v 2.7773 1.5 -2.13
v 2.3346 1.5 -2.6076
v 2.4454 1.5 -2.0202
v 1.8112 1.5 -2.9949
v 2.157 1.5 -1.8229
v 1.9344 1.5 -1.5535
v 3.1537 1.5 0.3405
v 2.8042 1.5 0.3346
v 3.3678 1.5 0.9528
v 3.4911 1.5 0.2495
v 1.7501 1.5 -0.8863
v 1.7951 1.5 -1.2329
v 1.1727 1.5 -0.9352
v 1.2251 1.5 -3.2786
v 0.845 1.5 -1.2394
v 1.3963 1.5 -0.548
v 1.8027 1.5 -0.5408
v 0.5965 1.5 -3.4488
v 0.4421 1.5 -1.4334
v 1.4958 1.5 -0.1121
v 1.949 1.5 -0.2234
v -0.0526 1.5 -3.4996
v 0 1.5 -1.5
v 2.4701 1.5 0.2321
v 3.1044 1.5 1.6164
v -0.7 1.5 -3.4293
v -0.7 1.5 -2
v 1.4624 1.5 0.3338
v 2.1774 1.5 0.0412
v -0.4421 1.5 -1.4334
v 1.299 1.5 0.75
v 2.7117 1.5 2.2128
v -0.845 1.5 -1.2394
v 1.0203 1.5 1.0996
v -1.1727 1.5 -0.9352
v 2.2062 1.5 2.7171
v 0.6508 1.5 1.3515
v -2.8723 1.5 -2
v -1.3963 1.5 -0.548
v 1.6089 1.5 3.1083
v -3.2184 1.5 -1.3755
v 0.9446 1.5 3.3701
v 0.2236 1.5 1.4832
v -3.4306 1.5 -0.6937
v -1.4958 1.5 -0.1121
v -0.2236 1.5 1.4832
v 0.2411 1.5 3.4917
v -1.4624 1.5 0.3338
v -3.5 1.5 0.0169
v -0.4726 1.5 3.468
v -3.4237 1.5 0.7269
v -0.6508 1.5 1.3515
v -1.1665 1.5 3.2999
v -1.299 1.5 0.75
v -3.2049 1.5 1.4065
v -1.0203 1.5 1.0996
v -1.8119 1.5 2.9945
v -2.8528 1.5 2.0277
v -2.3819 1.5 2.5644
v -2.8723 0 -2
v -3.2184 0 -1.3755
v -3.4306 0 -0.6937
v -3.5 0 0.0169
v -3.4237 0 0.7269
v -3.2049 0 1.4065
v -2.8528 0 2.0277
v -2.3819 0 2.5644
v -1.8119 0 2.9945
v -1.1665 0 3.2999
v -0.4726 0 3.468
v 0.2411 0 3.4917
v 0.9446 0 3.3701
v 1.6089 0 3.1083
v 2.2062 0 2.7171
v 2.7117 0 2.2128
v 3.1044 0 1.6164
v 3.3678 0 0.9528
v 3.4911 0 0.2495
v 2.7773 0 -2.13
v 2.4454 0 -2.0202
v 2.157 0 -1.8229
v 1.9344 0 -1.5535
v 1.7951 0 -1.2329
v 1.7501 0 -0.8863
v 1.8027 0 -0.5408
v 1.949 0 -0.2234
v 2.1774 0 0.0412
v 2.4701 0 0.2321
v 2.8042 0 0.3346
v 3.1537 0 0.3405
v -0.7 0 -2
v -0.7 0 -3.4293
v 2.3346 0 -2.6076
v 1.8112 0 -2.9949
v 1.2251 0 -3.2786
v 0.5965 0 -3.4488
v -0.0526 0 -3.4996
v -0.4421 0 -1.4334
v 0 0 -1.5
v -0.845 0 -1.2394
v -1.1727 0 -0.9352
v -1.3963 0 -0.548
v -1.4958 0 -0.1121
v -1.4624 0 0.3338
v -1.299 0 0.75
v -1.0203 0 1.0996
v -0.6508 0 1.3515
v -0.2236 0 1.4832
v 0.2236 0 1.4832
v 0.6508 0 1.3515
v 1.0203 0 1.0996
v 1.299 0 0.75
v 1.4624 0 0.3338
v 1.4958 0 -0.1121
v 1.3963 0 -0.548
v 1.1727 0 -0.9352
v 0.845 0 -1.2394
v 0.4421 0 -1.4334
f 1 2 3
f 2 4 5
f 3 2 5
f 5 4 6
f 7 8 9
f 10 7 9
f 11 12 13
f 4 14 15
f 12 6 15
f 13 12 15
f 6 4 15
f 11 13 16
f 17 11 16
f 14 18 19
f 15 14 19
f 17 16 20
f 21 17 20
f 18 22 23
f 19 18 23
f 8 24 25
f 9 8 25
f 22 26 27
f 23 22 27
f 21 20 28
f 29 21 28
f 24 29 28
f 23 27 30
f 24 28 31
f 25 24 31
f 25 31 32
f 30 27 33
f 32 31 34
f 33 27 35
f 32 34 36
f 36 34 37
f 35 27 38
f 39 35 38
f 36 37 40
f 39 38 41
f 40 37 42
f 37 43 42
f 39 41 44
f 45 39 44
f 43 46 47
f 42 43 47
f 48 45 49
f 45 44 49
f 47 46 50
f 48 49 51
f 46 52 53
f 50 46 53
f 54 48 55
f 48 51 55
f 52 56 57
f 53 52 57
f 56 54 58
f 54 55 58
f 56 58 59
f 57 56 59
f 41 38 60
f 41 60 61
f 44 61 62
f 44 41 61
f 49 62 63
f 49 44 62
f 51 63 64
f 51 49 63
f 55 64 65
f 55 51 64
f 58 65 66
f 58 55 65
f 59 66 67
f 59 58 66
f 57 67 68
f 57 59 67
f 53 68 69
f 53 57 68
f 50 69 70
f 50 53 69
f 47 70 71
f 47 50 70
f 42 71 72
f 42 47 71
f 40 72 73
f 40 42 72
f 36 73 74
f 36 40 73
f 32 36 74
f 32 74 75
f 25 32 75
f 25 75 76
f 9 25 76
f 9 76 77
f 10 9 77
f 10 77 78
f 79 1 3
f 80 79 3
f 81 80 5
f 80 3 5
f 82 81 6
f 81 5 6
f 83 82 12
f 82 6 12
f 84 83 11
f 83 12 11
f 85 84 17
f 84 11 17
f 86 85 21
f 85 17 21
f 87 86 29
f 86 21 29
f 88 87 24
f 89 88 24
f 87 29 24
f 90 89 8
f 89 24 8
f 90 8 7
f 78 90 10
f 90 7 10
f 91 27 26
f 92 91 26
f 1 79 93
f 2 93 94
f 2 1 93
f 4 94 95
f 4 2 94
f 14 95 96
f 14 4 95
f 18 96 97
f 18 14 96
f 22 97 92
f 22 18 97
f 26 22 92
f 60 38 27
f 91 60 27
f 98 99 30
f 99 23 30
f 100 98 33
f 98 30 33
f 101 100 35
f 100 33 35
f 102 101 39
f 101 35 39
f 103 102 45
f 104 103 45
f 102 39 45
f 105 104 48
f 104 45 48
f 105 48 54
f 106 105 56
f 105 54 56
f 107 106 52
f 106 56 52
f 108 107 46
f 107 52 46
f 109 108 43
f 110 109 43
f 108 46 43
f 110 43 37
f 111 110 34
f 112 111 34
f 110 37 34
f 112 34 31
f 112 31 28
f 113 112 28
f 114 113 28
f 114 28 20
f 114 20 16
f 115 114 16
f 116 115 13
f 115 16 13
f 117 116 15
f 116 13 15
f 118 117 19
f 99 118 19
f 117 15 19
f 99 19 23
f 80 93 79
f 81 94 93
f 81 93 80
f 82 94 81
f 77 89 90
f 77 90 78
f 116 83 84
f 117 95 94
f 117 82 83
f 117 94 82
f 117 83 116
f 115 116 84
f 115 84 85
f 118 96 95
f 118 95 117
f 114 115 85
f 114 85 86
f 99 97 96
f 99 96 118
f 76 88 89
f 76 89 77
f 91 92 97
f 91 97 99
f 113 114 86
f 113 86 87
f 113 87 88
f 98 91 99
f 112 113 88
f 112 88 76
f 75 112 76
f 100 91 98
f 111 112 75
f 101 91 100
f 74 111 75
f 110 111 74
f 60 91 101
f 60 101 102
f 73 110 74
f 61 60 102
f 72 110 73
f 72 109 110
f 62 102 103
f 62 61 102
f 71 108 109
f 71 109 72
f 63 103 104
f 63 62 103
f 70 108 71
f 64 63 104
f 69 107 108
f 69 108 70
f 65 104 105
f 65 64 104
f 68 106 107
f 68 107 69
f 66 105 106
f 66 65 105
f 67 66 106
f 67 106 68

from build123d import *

# Parameters (mm, degrees)
SKETCH_1_W          = 2
SKETCH_1_H          = 1.5
CUT_EXTRUDE_1_DEPTH = 6.172040216


with BuildPart() as part:
    # Эскиз1 → Повернуть1 (revolve)
    with BuildSketch(Plane.XY, mode=Mode.PRIVATE) as revolve_1_sk:
        with Locations((2.5, 0.75)):
            Rectangle(SKETCH_1_W, SKETCH_1_H)
    revolve(revolve_1_sk.sketch.rotate(Axis((0, 0, 0), (0, 1, 0)), 90), axis=Axis((0, 0, 0), (0, 1, 0)))

    # Эскиз2 → Вырез-Вытянуть1 (cut, through all)
    with BuildSketch(Plane(origin=(0, 1.5, 0), x_dir=(1, 0, 0), z_dir=(0, 1, 0))):
        with BuildLine():
            Line((-0.7, 2), (-0.7, 3.42928564))
            ThreePointArc((-0.7, 3.42928564), (-1.923801659, 2.923865109), (-2.872281323, 2))
            Line((-2.872281323, 2), (-0.7, 2))
        make_face()
        with BuildLine():
            ThreePointArc((3.491096592, -0.249488641), (3.352391998, 1.005717599), (2.777252031, 2.129993229))
            ThreePointArc((2.777252031, 2.129993229), (1.802717143, 0.540815143), (3.491096592, -0.249488641))
        make_face()
    extrude(amount=-CUT_EXTRUDE_1_DEPTH, mode=Mode.SUBTRACT)


solid = part.part
